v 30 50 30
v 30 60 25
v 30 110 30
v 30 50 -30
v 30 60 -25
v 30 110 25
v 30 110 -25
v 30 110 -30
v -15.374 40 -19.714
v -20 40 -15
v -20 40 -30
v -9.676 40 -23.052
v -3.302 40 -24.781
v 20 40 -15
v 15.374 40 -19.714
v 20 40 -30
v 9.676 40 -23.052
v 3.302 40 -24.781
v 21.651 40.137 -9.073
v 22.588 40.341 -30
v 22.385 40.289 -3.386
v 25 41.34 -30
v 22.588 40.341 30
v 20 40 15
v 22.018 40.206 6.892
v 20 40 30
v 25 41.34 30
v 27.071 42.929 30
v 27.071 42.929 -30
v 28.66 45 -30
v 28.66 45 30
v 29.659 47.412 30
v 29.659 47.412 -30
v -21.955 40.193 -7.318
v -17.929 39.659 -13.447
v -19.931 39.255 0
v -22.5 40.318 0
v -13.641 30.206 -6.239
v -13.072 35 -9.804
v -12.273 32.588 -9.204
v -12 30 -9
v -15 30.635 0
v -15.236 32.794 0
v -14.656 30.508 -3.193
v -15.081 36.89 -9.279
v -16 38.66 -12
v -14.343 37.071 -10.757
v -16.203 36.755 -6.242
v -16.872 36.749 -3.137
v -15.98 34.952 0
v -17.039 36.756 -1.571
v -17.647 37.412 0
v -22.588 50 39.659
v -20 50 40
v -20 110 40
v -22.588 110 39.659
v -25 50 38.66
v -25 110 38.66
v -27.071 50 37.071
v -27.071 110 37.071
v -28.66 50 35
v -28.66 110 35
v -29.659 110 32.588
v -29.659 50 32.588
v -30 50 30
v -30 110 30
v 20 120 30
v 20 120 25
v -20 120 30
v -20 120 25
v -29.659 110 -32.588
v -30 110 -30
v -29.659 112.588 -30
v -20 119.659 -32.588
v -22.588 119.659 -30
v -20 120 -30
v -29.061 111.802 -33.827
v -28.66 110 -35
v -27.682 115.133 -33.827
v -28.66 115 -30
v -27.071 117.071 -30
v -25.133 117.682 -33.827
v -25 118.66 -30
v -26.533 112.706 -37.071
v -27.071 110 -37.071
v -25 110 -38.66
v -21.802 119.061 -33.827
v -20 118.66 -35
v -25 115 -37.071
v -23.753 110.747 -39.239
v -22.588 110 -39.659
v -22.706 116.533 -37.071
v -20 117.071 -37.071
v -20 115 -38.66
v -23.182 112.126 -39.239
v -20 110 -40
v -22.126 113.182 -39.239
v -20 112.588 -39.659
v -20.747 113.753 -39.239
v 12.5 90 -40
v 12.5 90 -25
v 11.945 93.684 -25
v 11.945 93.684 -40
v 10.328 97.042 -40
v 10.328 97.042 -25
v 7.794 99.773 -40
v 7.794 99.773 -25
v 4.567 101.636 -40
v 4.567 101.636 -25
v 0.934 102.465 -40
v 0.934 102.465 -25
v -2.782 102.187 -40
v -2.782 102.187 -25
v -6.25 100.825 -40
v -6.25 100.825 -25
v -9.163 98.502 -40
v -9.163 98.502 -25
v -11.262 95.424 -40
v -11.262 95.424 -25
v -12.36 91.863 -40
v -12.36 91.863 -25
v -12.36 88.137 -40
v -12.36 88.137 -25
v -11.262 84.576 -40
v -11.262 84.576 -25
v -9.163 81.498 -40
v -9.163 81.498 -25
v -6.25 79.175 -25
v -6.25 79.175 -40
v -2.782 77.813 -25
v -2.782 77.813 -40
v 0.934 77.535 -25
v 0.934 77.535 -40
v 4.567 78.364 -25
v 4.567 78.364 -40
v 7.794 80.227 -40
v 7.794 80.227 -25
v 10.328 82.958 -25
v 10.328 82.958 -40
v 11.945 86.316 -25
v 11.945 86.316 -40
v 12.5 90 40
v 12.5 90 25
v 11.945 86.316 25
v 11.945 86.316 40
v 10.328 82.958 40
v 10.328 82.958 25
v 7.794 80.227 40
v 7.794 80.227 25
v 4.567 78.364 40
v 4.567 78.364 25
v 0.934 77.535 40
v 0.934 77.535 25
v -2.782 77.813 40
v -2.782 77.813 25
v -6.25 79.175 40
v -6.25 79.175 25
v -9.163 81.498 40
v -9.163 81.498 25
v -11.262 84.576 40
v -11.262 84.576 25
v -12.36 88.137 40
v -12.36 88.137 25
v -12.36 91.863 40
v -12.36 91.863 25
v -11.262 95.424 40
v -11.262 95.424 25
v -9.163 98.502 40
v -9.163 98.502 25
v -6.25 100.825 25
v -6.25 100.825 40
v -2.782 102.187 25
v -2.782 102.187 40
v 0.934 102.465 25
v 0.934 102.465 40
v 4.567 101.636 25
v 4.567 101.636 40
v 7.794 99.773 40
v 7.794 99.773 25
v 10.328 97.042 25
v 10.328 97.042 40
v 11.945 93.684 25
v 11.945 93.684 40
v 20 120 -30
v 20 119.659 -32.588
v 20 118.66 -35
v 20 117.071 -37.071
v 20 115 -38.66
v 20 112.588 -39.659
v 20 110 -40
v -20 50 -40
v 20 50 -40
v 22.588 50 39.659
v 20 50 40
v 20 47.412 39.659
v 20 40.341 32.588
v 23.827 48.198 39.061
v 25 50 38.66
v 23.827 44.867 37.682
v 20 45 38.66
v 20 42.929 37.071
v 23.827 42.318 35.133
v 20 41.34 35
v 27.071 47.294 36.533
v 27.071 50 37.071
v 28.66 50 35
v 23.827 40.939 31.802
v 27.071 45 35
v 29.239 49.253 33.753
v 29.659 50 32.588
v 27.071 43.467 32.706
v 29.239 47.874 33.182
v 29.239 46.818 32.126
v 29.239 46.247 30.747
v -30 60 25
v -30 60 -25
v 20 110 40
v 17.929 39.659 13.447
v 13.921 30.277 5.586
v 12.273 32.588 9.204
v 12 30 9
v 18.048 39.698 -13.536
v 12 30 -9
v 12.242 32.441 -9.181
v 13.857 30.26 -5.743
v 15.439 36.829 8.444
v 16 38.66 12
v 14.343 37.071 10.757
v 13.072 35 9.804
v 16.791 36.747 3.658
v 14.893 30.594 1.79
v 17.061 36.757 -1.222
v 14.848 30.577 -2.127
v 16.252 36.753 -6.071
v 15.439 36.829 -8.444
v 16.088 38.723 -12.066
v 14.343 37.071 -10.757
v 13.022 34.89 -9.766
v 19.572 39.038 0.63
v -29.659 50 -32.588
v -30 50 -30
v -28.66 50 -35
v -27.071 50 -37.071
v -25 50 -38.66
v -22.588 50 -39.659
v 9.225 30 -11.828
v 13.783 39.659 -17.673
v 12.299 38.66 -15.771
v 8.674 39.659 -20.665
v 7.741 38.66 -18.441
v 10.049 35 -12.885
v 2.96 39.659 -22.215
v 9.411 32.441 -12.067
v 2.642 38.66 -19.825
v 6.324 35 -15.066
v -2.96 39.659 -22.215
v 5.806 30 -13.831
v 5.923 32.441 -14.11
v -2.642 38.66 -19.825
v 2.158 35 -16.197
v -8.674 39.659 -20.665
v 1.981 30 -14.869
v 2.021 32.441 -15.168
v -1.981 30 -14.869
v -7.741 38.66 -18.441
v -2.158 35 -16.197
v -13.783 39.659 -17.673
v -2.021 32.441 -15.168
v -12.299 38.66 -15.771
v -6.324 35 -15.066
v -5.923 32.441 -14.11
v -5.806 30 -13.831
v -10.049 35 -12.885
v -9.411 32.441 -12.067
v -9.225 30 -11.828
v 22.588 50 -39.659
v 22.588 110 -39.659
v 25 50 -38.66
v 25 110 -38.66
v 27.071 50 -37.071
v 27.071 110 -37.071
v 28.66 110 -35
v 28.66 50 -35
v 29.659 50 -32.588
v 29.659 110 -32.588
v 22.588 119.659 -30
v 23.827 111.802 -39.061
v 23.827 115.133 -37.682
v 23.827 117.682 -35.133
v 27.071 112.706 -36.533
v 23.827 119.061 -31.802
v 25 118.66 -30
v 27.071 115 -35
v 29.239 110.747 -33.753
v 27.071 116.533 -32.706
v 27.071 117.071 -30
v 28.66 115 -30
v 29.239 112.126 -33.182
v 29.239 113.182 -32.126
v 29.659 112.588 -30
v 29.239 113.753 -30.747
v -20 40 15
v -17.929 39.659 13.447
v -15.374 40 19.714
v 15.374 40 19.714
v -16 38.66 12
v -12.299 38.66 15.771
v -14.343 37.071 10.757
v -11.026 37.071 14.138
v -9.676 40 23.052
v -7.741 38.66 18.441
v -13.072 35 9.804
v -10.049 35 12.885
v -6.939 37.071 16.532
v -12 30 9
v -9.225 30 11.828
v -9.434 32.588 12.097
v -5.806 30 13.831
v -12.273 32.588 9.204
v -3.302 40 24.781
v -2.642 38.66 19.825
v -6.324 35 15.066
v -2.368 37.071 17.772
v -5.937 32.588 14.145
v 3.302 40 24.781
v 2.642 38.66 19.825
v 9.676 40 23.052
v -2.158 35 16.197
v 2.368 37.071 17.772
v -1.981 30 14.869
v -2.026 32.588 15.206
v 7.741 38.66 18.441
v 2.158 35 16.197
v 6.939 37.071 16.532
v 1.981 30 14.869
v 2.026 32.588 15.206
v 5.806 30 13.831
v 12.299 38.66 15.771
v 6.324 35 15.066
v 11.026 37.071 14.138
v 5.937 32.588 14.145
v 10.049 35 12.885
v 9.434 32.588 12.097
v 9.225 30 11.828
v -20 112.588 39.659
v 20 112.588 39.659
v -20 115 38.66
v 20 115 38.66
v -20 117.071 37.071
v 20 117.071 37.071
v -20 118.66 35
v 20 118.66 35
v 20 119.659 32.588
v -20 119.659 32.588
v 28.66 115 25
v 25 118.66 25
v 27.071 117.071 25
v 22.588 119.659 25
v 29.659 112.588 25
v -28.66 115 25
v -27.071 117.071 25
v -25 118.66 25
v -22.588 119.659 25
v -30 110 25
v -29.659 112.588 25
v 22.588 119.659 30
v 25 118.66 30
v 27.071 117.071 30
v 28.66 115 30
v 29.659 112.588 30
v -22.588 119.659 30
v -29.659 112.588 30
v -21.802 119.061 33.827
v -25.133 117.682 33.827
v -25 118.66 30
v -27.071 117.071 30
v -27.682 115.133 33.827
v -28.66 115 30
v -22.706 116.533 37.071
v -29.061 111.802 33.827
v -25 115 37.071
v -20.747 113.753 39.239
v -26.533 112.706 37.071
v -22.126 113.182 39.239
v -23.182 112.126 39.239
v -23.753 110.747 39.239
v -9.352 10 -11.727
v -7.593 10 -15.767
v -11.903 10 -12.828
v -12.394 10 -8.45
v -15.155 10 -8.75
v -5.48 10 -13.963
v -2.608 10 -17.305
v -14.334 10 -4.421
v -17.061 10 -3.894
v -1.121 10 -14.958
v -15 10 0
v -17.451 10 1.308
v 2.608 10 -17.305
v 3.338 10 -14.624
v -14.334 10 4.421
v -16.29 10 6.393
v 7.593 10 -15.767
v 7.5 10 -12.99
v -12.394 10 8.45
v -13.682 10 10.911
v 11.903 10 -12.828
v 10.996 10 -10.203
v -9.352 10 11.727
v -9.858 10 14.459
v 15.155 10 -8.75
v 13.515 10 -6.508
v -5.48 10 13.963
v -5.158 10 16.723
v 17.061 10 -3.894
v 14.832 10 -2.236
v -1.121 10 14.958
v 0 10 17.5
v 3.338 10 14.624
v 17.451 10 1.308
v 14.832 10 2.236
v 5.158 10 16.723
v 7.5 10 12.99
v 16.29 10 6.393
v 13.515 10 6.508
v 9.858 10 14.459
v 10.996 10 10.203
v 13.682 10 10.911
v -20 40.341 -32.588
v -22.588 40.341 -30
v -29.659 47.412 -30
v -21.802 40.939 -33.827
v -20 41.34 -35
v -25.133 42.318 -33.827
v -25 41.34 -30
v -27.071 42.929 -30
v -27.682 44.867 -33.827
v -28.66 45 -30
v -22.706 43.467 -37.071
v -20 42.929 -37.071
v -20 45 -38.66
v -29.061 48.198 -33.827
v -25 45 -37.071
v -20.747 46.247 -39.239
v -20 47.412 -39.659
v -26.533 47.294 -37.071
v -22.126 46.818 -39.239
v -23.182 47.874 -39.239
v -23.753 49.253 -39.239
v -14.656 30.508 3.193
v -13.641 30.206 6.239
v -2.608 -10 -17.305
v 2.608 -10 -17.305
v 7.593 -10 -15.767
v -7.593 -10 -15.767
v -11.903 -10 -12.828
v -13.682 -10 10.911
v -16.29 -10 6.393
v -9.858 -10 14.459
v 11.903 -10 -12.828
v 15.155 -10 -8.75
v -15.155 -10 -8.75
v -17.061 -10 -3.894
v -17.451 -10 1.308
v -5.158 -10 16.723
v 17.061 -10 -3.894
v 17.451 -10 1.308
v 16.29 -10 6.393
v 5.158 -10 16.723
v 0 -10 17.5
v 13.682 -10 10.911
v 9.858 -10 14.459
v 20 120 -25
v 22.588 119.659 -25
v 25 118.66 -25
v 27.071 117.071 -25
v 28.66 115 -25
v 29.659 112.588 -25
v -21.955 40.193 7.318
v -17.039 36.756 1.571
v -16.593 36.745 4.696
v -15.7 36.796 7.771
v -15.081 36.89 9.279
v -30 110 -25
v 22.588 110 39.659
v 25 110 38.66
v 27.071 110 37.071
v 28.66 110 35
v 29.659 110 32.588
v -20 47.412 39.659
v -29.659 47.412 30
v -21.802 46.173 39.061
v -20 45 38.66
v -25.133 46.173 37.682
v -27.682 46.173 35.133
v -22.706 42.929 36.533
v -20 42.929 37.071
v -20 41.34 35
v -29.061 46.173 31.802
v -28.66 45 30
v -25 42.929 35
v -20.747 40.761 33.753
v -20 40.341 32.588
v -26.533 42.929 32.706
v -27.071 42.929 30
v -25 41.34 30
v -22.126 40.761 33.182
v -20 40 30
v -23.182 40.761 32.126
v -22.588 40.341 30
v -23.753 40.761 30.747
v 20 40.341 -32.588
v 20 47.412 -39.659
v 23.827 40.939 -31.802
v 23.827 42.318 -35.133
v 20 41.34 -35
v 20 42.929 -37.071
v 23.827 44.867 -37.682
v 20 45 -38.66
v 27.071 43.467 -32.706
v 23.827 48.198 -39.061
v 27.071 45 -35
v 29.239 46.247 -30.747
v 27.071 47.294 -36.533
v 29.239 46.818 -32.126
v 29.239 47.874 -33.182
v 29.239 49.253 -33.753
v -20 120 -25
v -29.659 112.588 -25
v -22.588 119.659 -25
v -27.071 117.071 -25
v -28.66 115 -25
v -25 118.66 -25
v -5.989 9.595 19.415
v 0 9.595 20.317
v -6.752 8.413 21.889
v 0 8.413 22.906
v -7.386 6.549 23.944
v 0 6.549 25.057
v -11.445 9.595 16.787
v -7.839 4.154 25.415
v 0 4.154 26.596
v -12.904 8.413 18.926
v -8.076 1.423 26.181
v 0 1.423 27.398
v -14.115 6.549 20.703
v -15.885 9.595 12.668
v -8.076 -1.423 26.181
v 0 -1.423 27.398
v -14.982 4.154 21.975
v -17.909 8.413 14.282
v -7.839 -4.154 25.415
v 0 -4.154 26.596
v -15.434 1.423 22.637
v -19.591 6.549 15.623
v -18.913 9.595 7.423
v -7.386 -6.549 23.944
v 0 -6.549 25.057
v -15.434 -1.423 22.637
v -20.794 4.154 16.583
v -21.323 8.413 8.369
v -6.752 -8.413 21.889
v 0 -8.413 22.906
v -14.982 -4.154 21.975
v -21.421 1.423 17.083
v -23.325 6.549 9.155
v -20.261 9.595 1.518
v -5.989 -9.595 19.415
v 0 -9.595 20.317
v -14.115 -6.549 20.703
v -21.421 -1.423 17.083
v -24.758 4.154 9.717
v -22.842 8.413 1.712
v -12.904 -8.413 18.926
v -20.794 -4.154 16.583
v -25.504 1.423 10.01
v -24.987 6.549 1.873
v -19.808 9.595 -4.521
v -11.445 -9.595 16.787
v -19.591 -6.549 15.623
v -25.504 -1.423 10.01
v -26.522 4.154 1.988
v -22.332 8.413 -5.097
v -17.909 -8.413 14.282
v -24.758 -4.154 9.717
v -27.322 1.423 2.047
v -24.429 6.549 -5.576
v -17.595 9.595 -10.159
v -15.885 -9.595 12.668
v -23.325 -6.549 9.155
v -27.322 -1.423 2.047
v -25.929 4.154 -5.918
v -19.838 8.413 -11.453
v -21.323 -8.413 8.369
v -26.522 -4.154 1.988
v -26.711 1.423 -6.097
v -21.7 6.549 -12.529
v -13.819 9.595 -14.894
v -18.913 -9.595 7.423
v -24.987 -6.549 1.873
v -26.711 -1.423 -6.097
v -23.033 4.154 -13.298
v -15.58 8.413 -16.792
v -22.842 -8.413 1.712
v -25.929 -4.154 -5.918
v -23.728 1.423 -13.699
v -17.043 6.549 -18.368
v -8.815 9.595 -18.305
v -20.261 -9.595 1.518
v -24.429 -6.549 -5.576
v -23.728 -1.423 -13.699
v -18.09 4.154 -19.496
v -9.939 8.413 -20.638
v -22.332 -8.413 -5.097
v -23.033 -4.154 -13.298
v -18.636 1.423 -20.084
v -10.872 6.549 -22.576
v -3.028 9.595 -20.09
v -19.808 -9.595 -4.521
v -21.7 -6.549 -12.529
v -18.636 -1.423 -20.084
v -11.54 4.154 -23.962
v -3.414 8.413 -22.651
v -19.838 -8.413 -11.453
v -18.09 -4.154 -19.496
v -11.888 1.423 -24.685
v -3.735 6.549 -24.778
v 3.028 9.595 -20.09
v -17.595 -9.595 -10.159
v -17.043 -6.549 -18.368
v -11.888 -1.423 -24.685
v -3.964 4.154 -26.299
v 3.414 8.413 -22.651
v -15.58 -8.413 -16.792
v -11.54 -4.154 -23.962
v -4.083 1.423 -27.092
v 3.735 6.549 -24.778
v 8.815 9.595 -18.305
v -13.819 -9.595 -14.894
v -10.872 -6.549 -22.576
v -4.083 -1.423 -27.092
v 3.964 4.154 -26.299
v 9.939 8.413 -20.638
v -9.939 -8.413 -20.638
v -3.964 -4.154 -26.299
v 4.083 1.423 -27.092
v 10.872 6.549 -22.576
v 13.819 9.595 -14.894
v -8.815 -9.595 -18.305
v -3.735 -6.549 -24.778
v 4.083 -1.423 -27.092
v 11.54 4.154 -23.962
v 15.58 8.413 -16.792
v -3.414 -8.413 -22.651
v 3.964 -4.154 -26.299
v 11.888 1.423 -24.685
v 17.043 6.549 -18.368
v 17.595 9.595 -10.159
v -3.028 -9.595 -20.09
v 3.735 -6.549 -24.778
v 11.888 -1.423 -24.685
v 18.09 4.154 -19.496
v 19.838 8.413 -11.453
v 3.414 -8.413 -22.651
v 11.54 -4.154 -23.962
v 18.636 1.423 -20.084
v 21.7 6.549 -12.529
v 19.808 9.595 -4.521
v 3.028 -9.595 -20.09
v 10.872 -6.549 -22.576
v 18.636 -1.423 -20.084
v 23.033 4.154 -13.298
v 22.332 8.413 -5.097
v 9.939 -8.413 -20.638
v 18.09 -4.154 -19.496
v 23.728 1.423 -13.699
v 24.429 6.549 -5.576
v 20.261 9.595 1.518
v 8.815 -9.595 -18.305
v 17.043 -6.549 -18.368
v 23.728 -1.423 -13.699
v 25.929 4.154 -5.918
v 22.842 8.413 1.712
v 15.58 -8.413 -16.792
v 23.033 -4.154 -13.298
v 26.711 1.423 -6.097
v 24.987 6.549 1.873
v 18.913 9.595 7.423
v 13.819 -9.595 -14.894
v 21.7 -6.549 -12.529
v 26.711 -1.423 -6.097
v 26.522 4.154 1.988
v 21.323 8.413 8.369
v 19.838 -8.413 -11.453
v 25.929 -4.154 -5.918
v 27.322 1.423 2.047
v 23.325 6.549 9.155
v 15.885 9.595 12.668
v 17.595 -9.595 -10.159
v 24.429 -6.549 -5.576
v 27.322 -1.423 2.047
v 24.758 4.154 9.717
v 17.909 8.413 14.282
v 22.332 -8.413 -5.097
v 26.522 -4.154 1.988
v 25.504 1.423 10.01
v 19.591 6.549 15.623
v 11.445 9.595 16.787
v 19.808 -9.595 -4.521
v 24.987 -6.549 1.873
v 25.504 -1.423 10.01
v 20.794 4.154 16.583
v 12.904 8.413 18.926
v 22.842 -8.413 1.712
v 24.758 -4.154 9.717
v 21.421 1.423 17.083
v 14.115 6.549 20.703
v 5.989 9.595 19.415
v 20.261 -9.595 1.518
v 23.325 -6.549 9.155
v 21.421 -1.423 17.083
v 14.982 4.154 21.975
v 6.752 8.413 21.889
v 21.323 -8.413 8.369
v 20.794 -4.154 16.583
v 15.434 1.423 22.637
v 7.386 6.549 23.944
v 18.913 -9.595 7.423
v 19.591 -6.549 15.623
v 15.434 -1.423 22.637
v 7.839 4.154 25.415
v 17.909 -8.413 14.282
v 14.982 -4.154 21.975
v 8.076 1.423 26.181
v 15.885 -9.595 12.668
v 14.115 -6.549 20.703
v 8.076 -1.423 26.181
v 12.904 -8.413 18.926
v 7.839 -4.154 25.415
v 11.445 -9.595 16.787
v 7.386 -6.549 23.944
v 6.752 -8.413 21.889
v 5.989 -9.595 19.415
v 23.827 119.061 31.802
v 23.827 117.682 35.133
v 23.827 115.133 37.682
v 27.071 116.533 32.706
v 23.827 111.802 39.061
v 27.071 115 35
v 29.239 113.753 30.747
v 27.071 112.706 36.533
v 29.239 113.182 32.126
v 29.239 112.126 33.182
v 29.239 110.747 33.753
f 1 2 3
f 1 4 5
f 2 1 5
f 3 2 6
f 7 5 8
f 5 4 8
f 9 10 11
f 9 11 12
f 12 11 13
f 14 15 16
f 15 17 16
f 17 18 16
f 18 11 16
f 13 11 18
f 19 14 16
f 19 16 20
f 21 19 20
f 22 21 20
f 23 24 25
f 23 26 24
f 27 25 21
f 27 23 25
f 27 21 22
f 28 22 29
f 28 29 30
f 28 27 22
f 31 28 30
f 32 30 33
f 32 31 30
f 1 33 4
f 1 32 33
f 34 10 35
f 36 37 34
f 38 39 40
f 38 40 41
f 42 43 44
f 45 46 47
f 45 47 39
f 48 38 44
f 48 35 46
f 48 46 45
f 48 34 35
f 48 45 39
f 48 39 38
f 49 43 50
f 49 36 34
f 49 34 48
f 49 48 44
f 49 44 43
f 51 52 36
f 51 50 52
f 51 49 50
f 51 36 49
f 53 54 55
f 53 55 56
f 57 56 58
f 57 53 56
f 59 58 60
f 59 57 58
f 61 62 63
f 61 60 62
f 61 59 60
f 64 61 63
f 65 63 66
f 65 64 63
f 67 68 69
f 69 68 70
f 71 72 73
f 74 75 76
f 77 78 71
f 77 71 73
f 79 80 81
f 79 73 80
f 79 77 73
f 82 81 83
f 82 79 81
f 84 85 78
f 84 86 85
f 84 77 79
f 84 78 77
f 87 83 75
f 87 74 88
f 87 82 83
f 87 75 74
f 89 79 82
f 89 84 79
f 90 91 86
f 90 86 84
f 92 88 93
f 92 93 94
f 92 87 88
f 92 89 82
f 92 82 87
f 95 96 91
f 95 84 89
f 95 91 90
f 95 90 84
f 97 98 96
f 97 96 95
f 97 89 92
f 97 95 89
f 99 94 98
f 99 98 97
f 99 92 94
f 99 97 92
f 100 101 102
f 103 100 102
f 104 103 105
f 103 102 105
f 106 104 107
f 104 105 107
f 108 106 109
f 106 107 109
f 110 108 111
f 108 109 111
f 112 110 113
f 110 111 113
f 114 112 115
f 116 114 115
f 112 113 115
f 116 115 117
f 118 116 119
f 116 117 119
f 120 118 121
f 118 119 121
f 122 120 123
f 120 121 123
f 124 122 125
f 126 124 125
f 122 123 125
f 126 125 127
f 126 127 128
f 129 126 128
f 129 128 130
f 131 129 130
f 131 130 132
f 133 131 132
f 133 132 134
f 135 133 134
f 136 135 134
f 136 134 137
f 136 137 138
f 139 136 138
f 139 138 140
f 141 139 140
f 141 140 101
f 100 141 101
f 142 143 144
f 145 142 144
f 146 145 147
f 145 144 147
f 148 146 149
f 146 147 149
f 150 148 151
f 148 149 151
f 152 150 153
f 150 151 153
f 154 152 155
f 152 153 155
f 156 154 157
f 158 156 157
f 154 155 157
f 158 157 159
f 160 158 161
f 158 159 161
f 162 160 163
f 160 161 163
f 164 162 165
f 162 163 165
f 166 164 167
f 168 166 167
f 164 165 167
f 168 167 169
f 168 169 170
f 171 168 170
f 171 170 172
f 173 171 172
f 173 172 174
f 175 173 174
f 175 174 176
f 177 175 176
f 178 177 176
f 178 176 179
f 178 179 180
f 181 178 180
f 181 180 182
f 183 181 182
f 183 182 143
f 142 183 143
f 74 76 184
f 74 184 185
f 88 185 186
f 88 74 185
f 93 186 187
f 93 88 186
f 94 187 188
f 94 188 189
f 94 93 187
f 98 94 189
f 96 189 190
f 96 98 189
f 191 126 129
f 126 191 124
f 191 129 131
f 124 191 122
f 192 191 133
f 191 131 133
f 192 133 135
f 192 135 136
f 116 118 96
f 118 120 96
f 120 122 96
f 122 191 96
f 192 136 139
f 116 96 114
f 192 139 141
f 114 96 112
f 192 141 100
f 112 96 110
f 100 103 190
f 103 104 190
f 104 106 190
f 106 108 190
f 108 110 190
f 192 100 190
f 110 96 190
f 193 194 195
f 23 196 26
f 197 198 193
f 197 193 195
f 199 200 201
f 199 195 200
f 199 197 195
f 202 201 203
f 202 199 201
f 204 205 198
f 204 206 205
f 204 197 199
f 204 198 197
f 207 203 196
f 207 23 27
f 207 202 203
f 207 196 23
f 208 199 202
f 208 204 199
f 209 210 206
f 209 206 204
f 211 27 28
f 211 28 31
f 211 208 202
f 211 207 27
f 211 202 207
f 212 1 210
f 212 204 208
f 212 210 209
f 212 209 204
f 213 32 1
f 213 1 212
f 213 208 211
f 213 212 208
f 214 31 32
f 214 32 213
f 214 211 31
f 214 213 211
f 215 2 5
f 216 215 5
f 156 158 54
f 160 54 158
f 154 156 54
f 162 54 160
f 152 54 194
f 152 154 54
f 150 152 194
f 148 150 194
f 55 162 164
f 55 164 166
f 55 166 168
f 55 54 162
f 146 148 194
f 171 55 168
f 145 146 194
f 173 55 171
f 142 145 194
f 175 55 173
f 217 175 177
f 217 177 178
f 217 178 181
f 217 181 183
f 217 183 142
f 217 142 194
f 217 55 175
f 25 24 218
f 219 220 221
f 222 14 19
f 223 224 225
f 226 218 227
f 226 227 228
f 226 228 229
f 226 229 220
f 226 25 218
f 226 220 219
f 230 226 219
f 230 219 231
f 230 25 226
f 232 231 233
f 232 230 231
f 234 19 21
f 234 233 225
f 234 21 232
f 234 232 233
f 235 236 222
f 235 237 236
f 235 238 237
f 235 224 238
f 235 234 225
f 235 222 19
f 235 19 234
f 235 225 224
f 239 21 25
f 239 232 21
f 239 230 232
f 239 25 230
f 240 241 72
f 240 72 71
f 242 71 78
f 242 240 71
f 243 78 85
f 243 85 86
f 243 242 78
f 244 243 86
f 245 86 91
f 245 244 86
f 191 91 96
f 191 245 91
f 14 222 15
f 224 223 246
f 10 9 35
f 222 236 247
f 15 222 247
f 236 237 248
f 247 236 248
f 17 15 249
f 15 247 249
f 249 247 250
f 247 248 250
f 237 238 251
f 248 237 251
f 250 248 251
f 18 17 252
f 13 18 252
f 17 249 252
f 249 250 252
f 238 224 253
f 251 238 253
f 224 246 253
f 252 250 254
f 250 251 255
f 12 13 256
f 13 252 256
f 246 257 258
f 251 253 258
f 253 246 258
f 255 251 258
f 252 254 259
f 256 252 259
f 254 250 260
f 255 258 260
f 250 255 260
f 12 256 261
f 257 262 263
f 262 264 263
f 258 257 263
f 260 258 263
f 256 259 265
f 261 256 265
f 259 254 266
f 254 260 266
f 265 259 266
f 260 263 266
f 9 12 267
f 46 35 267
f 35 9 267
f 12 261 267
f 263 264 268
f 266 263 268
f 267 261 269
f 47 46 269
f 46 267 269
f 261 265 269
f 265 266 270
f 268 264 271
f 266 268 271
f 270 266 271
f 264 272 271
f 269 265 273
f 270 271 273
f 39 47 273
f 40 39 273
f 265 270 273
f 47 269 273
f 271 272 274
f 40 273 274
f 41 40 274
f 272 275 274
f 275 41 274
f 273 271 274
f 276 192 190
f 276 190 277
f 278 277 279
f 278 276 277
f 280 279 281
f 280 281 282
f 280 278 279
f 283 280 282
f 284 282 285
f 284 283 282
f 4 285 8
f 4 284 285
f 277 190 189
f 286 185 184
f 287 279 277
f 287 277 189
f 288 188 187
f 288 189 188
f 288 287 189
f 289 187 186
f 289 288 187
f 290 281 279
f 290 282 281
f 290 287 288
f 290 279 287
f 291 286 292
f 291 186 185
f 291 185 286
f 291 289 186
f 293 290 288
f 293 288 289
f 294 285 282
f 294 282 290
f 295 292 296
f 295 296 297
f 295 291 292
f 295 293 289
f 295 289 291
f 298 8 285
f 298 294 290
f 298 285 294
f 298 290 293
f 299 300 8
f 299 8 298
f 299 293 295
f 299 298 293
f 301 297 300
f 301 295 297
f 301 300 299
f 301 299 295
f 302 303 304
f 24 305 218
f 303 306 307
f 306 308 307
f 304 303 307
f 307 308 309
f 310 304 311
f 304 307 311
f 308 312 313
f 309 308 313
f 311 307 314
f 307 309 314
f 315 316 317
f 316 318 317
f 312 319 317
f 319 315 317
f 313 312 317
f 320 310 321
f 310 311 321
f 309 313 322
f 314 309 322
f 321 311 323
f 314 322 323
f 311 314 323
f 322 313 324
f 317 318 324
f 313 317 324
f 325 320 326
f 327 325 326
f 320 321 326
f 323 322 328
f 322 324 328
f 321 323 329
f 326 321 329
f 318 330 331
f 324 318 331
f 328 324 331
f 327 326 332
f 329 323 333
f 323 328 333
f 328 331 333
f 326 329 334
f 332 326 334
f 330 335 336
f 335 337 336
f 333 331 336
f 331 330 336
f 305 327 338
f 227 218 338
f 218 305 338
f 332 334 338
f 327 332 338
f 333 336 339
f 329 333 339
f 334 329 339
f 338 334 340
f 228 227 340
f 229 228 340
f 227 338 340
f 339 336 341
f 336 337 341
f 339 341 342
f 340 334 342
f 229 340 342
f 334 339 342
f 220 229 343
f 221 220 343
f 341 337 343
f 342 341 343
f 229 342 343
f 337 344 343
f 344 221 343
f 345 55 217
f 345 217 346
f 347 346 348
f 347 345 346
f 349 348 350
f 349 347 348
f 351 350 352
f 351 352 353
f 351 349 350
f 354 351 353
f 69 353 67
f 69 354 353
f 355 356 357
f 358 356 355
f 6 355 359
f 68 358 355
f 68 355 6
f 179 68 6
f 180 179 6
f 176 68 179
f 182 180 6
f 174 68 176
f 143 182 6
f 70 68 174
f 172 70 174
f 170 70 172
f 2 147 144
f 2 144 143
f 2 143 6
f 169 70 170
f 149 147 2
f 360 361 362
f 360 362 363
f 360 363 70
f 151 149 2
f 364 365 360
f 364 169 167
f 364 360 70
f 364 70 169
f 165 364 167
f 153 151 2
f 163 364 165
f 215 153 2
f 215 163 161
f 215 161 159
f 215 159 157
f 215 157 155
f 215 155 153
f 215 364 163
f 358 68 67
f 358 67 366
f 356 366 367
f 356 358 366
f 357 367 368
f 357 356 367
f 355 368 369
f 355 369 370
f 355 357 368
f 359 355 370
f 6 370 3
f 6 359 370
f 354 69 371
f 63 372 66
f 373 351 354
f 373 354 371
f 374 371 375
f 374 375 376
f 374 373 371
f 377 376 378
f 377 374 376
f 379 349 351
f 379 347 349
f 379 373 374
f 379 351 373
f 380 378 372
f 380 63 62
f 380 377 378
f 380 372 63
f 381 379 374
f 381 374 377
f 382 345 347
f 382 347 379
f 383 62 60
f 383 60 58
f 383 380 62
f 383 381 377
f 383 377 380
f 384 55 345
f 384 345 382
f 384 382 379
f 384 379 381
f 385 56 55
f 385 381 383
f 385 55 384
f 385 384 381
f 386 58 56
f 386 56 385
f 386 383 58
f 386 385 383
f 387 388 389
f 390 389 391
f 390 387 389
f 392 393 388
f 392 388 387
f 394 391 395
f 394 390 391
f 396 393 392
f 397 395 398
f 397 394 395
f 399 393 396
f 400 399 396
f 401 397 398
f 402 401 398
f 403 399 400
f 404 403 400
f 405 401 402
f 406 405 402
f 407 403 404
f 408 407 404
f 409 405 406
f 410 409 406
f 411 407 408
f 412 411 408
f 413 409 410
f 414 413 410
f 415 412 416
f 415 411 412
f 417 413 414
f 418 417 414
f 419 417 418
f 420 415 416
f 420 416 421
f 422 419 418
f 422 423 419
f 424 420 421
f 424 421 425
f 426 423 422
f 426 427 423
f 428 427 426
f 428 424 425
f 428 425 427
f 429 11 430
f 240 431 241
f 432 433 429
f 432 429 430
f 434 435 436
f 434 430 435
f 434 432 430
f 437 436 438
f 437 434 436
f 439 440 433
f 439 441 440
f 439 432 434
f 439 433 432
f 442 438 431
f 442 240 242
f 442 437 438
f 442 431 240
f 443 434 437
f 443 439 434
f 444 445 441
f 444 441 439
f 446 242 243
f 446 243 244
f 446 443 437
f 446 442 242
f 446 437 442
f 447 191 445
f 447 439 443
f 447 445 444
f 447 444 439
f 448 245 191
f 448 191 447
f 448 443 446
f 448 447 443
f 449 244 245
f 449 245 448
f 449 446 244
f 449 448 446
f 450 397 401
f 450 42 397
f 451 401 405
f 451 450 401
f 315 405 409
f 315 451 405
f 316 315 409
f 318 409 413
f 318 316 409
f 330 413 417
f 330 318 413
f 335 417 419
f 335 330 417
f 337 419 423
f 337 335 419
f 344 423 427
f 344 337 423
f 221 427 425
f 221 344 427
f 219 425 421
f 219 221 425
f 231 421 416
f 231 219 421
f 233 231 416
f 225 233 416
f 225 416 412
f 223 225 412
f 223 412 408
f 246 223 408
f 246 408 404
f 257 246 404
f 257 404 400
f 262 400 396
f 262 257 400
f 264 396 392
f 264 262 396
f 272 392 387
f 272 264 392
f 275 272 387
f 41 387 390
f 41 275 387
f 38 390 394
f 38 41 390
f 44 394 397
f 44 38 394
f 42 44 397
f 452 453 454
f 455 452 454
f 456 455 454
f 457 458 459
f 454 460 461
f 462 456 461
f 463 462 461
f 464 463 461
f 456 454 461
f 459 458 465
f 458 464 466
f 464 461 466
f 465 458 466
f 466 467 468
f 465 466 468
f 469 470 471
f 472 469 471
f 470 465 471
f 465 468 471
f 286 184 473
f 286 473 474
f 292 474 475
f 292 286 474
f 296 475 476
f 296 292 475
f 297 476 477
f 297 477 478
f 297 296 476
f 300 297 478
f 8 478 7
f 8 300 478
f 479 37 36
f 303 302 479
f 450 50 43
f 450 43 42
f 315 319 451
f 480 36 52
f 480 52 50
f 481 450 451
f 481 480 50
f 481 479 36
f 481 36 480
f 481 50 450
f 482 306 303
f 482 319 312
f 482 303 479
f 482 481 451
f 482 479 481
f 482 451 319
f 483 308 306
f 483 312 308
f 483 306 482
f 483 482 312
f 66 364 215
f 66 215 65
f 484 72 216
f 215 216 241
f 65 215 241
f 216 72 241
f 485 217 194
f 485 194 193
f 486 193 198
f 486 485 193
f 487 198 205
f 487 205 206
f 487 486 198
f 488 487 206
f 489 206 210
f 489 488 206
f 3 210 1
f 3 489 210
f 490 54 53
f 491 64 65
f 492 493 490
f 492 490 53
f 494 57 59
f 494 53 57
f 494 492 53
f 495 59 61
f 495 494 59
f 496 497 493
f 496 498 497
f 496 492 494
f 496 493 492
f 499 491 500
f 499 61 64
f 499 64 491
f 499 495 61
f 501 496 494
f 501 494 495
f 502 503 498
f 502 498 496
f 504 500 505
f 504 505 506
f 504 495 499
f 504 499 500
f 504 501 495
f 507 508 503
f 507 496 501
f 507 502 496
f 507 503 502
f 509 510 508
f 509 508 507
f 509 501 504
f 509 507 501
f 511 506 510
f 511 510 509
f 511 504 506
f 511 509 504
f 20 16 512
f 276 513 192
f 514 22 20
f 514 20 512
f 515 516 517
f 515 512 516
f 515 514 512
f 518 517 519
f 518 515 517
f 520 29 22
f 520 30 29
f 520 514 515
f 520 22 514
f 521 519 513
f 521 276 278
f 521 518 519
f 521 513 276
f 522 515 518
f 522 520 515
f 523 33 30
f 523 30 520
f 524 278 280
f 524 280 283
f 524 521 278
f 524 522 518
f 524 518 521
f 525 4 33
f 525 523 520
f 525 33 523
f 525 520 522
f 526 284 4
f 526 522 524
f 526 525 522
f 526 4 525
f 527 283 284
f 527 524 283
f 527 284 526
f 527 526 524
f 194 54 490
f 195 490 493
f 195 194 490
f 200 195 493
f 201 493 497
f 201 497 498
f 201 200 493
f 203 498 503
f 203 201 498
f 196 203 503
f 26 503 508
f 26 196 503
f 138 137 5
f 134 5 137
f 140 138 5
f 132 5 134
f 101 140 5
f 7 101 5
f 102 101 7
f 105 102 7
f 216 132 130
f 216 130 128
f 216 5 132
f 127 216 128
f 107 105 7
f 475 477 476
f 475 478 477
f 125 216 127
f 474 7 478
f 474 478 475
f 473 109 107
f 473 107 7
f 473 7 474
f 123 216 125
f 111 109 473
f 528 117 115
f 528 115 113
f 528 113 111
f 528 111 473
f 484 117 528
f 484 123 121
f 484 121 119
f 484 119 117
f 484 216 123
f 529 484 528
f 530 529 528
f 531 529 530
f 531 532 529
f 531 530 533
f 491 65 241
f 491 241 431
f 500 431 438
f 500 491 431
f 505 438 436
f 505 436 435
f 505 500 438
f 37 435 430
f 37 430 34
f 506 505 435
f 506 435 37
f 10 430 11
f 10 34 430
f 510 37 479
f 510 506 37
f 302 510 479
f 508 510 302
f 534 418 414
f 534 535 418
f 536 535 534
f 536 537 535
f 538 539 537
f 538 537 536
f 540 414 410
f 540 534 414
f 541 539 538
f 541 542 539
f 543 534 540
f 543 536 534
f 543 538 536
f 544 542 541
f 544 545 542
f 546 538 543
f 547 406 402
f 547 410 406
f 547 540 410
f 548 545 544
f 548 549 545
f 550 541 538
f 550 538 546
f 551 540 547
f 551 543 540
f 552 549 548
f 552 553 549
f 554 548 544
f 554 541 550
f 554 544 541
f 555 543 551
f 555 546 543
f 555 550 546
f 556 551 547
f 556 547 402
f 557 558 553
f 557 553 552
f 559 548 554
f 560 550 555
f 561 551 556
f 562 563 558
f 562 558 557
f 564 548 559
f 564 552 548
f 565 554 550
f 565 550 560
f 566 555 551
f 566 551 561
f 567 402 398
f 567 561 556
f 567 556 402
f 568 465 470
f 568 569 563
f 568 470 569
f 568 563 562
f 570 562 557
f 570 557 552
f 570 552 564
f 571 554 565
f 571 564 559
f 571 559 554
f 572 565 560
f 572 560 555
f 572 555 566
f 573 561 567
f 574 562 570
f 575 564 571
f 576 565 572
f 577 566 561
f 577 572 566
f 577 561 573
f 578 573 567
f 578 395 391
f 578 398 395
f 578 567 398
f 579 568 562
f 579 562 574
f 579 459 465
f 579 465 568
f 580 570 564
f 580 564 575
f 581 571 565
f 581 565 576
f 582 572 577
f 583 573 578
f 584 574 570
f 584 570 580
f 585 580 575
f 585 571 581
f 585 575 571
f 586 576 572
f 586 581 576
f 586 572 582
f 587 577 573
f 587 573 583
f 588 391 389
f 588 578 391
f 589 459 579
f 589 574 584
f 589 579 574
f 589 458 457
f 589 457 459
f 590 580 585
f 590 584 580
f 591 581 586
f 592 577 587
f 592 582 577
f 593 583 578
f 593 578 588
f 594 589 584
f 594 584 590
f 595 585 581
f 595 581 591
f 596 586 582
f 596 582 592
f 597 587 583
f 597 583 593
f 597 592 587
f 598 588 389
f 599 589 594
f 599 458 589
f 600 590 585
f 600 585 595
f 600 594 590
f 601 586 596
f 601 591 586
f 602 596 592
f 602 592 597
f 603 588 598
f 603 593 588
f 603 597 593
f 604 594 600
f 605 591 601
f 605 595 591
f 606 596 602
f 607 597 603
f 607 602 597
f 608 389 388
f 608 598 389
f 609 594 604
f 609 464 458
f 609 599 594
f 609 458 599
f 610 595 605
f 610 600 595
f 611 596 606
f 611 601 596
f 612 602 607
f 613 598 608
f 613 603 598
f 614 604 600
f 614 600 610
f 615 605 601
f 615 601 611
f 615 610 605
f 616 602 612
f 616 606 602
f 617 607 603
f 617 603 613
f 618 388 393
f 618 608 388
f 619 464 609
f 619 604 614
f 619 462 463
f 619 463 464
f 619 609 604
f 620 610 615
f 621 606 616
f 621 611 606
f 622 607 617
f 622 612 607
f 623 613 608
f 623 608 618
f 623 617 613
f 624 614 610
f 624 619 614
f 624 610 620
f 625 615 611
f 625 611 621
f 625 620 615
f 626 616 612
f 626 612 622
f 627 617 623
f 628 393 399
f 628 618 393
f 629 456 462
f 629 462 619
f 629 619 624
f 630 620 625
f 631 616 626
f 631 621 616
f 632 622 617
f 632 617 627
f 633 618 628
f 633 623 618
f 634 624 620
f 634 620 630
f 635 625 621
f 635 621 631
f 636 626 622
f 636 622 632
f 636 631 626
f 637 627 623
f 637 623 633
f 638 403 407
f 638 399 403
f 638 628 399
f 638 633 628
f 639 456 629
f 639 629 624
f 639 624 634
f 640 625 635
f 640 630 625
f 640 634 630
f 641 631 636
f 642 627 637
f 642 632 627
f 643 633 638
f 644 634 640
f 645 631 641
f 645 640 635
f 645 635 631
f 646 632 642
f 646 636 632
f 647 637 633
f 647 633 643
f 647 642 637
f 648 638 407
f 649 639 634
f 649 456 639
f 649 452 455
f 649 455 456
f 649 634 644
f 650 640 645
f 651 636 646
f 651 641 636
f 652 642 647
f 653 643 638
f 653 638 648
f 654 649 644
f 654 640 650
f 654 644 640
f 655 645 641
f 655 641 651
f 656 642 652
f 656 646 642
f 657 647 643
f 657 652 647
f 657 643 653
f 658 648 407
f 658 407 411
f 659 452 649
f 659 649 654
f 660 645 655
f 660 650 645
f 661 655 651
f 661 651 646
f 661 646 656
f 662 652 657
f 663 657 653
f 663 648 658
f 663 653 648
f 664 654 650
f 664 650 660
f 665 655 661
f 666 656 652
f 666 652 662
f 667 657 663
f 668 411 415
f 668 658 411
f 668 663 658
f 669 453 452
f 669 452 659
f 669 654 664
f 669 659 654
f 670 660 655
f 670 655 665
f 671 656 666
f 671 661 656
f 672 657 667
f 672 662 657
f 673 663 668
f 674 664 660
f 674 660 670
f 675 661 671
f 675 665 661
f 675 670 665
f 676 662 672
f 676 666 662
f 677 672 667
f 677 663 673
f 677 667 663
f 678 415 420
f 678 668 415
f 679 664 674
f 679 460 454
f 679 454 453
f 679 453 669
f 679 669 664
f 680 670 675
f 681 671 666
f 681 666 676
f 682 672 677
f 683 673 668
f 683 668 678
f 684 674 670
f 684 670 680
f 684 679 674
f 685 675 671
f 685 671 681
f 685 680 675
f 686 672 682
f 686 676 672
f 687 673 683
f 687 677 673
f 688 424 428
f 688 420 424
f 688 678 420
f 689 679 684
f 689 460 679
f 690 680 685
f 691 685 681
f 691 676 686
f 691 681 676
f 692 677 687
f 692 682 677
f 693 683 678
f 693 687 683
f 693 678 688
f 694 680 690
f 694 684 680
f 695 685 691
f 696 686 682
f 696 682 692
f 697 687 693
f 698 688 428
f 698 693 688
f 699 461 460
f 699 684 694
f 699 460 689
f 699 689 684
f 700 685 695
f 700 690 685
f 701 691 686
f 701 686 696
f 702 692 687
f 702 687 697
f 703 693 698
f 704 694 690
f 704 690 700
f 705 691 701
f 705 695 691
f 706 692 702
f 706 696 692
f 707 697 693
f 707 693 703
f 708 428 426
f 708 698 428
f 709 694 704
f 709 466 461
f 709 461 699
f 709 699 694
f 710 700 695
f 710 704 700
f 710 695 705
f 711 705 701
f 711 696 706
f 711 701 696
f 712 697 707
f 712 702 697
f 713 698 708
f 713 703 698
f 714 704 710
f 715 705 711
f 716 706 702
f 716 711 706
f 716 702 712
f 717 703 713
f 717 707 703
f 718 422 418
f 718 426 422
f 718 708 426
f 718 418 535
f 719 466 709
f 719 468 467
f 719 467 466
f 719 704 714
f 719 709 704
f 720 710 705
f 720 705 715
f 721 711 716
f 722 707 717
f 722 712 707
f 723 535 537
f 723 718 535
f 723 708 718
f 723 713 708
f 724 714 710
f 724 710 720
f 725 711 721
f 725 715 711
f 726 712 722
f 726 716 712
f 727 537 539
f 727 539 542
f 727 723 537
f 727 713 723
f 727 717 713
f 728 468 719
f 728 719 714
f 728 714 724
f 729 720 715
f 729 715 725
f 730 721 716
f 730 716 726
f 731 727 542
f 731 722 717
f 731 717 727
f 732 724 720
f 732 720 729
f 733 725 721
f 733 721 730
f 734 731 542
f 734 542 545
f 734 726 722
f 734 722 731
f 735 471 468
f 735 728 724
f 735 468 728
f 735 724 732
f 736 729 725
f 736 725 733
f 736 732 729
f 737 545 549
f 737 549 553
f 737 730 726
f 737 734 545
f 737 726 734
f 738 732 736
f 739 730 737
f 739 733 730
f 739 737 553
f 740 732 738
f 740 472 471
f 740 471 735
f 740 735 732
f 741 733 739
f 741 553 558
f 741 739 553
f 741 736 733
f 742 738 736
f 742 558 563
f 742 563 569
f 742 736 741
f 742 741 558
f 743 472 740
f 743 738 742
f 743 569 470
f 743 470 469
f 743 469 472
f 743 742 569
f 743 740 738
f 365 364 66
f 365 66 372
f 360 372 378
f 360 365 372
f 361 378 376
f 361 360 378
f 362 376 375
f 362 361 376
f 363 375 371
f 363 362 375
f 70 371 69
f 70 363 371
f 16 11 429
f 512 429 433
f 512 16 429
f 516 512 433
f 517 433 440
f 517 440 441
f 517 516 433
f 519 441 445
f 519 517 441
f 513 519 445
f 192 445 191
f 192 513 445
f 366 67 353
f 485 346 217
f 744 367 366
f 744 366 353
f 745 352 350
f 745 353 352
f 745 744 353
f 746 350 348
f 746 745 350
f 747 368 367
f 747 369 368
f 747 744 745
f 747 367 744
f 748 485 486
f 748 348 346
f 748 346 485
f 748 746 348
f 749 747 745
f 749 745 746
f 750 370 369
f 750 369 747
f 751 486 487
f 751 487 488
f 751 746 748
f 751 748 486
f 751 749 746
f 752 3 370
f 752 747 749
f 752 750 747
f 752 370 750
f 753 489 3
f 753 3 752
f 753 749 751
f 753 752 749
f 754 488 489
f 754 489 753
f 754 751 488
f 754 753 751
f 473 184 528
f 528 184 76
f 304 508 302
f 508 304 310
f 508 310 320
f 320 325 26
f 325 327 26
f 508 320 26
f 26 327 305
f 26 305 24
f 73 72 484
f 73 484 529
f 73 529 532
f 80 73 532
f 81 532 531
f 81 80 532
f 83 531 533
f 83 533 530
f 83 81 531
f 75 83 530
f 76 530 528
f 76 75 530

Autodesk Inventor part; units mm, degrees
ref_plane "YZ Plane" through (0, 0, 0) normal (1, 0, 0) x (0, 1, 0)
ref_plane "XZ Plane" through (0, 0, 0) normal (0, 1, 0) x (-1, 0, 0)
ref_plane "XY Plane" through (0, 0, 0) normal (0, 0, 1) x (1, 0, 0)
sketch "Sketch1" plane through (0, 0, 0) normal (0, 0, 1) x (1, 0, 0)
  line L0 (0, 0) -> (0, 40)
  dimension "d0" = 40
sketch "Sketch2" plane through (0, 0, 0) normal (0, 1, 0) x (-1, 0, 0)
  circle A0 centre (0, 0) radius 15
  dimension "d3" = 30
sweep "Sweep1" add profiles "Sketch2" path "Sketch1"
sketch "Sketch4" plane through (0, 0, 0) normal (1, 0, 0) x (0, 1, 0)
  line L0 (0, 17.5) -> (0, -17.5) construction
  line L1 (10, 17.5) -> (10, -17.5)
  line L2 (-10, -17.5) -> (-10, 17.5)
  arc A0 (10, 17.5) -> (-10, 17.5) centre (0, 17.5) ccw
  arc A1 (-10, -17.5) -> (10, -17.5) centre (0, -17.5) ccw
  line L3 (-10, 0) -> (10, 0)
  point P0 (0, 0)
  dimension "d9" = 35
  dimension "d10" = 10
revolve "Revolution1" add sketch "Sketch4" angle 360 about axis through (0, -10, 0) along (0, 1, 0) contours L1 L3 L2 A0
sketch "Sketch5" plane through (0, 0, 0) normal (0, 0, 1) x (1, 0, 0)
  line L0 (-30, 40) -> (30, 40)
  line L1 (30, 40) -> (30, 120)
  line L2 (30, 120) -> (-30, 120)
  line L3 (-30, 120) -> (-30, 40)
  circle A0 centre (0, 90) radius 12.5
  line L4 (0, 0) -> (0, 40) construction
  line L5 (0, 90) -> (0, 40)
  dimension "d12" = 90
  dimension "d13" = 25
  dimension "d14" = 60
  dimension "d15" = 30
extrude "Extrusion1" add sketch "Sketch5" along normal mid plane 80
sketch "Sketch7" plane through (-30, 40, 40) normal (-1, 0, 0) x (0, 0, 1)
  line L0 (-80, 80) -> (0, 80) construction
  line L1 (-65, 80) -> (-15, 80)
  line L2 (-15, 80) -> (-15, 20)
  line L3 (-15, 20) -> (-65, 20)
  line L4 (-65, 20) -> (-65, 80)
  line L5 (-80, 37.5) -> (-80, 62.5) construction
  line L6 (0, 62.5) -> (0, 37.5) construction
  line L7 (-80, 0) -> (-80, 80) construction
  line L8 (-80, 50) -> (0, 50) construction
  line L9 (0, 80) -> (0, 0) construction
  line L10 (-40, 50) -> (-40, 0) construction
  point P0 (-40, -40)
  dimension "d18" = 30
  dimension "d19" = 50
  dimension "d20" = 25
  dimension "d21" = 90
fillet "Fillet1" radius 10 13 edges at (-30, 80, 40) (30, 80, 40) (-30, 80, -40) (30, 80, -40) (-30, 40, 0) (0, 40, -40) (0, 40, 40) (30, 40, 0) (15, 40, 0) (-30, 120, 0) (0, 120, 40) (30, 120, 0) (0, 120, -40)
extrude "Extrusion2" cut sketch "Sketch7" against normal through all
equation "\"d20\" = 0.5 * d19"
properties part number "Elo-Bola Longo"
